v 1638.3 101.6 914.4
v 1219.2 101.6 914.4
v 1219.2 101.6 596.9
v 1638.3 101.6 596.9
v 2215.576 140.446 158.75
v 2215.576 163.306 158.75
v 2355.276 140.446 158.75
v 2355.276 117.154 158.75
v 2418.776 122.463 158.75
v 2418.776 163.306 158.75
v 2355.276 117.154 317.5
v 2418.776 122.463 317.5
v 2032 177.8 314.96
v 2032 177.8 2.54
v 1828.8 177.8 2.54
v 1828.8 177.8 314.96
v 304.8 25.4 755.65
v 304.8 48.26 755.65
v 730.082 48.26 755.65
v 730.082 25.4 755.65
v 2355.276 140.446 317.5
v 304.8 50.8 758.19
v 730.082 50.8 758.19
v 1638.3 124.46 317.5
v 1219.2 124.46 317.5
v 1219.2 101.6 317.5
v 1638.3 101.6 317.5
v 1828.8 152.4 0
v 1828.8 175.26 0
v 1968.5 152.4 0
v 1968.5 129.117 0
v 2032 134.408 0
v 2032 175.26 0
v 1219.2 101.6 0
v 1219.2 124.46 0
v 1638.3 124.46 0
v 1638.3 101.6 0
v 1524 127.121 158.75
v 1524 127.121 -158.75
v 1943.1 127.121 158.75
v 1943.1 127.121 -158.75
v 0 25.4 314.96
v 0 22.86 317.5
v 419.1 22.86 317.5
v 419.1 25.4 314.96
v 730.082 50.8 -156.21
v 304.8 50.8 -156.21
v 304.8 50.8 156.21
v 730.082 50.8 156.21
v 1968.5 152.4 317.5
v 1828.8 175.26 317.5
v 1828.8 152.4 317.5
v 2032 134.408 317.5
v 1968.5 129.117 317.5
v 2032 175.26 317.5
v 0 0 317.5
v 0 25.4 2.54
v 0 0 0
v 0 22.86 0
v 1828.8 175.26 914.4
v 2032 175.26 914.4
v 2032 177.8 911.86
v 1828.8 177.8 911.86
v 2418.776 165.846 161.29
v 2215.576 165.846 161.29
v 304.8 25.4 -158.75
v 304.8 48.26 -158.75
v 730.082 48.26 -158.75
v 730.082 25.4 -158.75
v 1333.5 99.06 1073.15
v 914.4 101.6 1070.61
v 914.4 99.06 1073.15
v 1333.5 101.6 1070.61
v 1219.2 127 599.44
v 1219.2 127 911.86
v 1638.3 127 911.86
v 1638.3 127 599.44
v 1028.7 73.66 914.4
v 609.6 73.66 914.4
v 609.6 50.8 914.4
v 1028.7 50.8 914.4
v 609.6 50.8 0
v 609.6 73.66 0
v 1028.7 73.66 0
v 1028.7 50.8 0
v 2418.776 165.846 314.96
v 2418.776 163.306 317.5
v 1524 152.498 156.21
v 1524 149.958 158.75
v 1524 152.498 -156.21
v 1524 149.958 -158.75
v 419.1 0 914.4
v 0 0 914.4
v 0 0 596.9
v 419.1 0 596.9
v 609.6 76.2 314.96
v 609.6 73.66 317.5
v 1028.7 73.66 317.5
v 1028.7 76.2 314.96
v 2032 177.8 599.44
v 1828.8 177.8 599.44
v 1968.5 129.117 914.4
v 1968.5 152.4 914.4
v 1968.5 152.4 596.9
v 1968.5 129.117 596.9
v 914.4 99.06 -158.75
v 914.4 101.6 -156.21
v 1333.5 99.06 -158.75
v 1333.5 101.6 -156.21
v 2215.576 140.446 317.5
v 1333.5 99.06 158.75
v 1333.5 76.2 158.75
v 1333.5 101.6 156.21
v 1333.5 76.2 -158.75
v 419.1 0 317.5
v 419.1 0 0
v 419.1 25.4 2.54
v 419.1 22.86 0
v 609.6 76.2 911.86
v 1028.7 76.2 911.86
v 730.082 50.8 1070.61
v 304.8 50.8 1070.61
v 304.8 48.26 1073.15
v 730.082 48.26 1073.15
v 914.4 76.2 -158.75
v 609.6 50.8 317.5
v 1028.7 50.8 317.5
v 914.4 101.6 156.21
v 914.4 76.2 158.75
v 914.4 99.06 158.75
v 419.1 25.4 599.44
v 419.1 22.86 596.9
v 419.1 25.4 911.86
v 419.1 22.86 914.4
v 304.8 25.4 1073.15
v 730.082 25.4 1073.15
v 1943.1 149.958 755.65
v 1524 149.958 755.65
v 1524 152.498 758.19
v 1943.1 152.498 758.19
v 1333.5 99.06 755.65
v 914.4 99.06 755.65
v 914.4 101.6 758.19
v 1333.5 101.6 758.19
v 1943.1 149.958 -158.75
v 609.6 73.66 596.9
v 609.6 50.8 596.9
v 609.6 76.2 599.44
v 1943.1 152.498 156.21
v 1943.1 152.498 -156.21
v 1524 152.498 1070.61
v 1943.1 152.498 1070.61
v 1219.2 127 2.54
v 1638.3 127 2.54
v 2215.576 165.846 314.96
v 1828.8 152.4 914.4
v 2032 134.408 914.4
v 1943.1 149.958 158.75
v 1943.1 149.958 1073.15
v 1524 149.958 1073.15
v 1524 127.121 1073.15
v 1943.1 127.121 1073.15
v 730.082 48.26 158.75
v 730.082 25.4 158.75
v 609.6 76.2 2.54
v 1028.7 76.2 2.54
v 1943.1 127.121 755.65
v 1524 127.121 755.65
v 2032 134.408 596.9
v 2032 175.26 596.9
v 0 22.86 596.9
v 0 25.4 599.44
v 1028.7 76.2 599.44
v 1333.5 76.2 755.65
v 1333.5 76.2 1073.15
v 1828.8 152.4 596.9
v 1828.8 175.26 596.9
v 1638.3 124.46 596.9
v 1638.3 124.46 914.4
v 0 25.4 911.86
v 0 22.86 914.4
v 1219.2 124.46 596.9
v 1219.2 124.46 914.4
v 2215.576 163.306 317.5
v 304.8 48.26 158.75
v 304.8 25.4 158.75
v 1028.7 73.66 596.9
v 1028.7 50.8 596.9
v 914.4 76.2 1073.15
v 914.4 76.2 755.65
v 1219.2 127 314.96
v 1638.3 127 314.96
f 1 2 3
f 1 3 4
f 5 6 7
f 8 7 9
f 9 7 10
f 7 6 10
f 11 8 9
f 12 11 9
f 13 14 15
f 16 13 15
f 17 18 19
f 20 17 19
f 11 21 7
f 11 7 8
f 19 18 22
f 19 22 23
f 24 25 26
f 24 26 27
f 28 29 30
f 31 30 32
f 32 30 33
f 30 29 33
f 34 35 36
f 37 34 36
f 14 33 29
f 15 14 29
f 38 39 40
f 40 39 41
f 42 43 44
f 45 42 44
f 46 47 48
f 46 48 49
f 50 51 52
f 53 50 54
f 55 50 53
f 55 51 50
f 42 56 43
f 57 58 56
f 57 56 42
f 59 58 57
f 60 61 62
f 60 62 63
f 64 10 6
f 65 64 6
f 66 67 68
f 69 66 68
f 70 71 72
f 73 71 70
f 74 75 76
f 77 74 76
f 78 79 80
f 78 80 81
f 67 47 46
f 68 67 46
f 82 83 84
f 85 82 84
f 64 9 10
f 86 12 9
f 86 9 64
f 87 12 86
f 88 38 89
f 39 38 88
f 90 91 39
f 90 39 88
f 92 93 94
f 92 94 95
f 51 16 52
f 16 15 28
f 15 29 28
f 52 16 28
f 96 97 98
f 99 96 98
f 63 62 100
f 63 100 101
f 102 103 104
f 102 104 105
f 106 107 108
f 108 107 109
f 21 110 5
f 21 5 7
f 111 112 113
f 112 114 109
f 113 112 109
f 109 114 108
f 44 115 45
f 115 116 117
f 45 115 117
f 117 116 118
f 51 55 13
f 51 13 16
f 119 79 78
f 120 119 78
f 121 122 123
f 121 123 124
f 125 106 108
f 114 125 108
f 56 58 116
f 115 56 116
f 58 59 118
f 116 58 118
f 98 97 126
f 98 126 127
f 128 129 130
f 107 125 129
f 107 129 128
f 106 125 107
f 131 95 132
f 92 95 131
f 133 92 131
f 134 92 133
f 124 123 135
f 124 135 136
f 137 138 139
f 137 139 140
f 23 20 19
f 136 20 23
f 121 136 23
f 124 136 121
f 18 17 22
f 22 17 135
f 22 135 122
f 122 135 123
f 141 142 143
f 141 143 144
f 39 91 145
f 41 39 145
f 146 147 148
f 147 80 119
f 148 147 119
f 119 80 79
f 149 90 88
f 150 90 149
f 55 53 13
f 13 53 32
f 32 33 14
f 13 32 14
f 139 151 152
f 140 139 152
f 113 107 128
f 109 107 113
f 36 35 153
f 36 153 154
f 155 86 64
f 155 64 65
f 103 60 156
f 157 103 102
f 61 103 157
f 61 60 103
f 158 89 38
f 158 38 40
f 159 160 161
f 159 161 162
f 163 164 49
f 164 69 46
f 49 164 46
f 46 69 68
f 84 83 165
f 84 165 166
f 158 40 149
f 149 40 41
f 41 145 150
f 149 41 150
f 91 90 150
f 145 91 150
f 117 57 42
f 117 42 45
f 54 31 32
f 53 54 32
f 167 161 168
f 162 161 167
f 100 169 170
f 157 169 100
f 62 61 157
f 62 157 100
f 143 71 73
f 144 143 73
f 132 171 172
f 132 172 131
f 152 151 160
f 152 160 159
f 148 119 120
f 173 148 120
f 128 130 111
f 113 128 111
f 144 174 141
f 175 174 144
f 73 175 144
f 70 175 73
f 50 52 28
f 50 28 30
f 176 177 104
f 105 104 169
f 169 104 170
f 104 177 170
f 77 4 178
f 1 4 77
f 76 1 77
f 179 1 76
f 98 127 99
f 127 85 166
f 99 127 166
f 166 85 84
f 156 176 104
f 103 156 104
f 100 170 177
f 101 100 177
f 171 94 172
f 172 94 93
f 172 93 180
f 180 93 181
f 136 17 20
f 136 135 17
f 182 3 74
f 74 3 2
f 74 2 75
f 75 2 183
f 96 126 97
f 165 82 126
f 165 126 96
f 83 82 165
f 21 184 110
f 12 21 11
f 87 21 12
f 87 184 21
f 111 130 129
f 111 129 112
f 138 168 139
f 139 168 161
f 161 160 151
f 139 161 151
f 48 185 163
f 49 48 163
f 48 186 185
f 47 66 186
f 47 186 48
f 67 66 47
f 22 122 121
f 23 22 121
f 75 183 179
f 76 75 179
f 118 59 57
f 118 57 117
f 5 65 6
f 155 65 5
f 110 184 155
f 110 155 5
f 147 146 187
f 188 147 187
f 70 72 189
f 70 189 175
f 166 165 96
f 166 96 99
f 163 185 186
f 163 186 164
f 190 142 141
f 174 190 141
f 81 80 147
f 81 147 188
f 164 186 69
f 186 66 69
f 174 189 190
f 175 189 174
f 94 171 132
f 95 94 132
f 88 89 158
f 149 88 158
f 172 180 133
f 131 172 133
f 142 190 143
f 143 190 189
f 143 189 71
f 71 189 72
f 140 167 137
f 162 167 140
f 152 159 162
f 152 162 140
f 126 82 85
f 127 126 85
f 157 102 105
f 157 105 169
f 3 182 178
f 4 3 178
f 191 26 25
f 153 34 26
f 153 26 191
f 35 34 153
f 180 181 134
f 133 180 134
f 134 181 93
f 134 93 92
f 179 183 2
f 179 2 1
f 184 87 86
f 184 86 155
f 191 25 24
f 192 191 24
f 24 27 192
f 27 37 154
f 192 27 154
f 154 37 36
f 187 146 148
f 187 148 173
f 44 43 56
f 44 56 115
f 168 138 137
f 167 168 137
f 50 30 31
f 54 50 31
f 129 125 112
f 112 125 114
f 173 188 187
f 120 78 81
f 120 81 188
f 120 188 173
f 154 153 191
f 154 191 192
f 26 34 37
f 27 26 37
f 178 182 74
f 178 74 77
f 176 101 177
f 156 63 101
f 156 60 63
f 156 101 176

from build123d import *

# Parameters (mm, degrees)
F0_W          = 419.1
F0_H          = 25.4
F1_DEPTH      = 317.5
F2_SIZE       = 2.54
F2_2_SIZE     = 2.54
F2_3_SIZE     = 2.54
F2_4_SIZE     = 2.54
F4_W          = 425.2820260142
F4_H          = 25.4
F5_DEPTH      = 311.15
F5_DEPTH_BACK = 6.35
F4_W_2        = 419.1
F4_H_2        = 25.3773033619
F6_SIZE       = 2.54
F6_2_SIZE     = 2.54
F6_3_SIZE     = 2.54
F8_DEPTH      = 158.75
F9_SIZE       = 2.54


# Not quite as in the source:
# - a feature names something its author has since deleted; it is built from what else it names


with BuildPart() as f1:
    # F0 (on Top) → F1 (new body)
    with BuildSketch(Plane.XY):
        with Locations((209.55, 12.7)):
            Rectangle(F0_W, F0_H)
    extrude(amount=F1_DEPTH)

    # F2
    f2_edges = [f1.edges().sort_by_distance(p)[0] for p in [
        (209.55, 25.4, 317.5),
        (209.55, 25.4, 0),
    ]]
    chamfer(f2_edges, length=F2_SIZE)


with BuildPart() as f1b:
    # F0 (on Top) → F1, piece 2 (new body)
    with BuildSketch(Plane.XY):
        with Locations((819.15, 63.5)):
            Rectangle(F0_W, F0_H)
    extrude(amount=F1_DEPTH)

    # F2#2
    f2_2_edges = [f1b.edges().sort_by_distance(p)[0] for p in [
        (819.15, 76.2, 317.5),
        (819.15, 76.2, 0),
    ]]
    chamfer(f2_2_edges, length=F2_2_SIZE)


with BuildPart() as f1c:
    # F0 (on Top) → F1, piece 3 (new body)
    with BuildSketch(Plane.XY):
        with Locations((1428.75, 114.3)):
            Rectangle(F0_W, F0_H)
    extrude(amount=F1_DEPTH)

    # F2#3
    f2_3_edges = [f1c.edges().sort_by_distance(p)[0] for p in [
        (1428.75, 127, 317.5),
        (1428.75, 127, 0),
    ]]
    chamfer(f2_3_edges, length=F2_3_SIZE)


with BuildPart() as f1d:
    # F0 (on Top) → F1, piece 4 (new body)
    with BuildSketch(Plane.XY):
        Polygon((1968.5, 152.4), (1968.5, 129.1166666667), (2032, 134.4083333333), (2032, 177.8), (1828.8, 177.8), (1828.8, 152.4), align=None)
    extrude(amount=F1_DEPTH)

    # F2#4
    f2_4_edges = [f1d.edges().sort_by_distance(p)[0] for p in [
        (1930.4, 177.8, 317.5),
        (1930.4, 177.8, 0),
    ]]
    chamfer(f2_4_edges, length=F2_4_SIZE)


with BuildPart() as f5:
    # F4 (on offset) → F5 (new body, two sides)
    with BuildSketch(Plane.XY.offset(152.4)) as f5_sk:
        with Locations((517.4410130071, 38.1)):
            Rectangle(F4_W, F4_H)
    extrude(amount=-F5_DEPTH)
    extrude(f5_sk.sketch, amount=F5_DEPTH_BACK)

    # F6
    f6_edges = [f5.edges().sort_by_distance(p)[0] for p in [
        (517.441013, 50.8, 158.75),
        (517.441013, 50.8, -158.75),
    ]]
    chamfer(f6_edges, length=F6_SIZE)


with BuildPart() as f5b:
    # F4 (on offset) → F5, piece 2 (new body, two sides)
    with BuildSketch(Plane.XY.offset(152.4)) as f5_2_sk:
        with Locations((1123.95, 88.9)):
            Rectangle(F4_W_2, F4_H)
    extrude(amount=-F5_DEPTH)
    extrude(f5_2_sk.sketch, amount=F5_DEPTH_BACK)

    # F6#2
    f6_2_edges = [f5b.edges().sort_by_distance(p)[0] for p in [
        (1123.95, 101.6, -158.75),
        (1123.95, 101.6, 158.75),
    ]]
    chamfer(f6_2_edges, length=F6_2_SIZE)


with BuildPart() as f5c:
    # F4 (on offset) → F5, piece 3 (new body, two sides)
    with BuildSketch(Plane.XY.offset(152.4)) as f5_3_sk:
        with Locations((1733.55, 139.8095786572)):
            Rectangle(F4_W_2, F4_H_2)
    extrude(amount=-F5_DEPTH)
    extrude(f5_3_sk.sketch, amount=F5_DEPTH_BACK)

    # F6#3
    f6_3_edges = [f5c.edges().sort_by_distance(p)[0] for p in [
        (1733.55, 152.49823, -158.75),
        (1733.55, 152.49823, 158.75),
    ]]
    chamfer(f6_3_edges, length=F6_3_SIZE)


with BuildPart() as f8:
    # F7 (on face) → F8 (new body)
    with BuildSketch(Plane.XY.offset(317.5)):
        Polygon((2418.7764174887, 165.8460989008), (2215.5764174887, 165.8460989008), (2215.5764174887, 140.4460989008), (2355.2764174887, 140.4460989008), (2355.2764174887, 117.1542989008), (2418.7764174887, 122.4628989008), align=None)
    extrude(amount=-F8_DEPTH)

    # F9
    f9_edges = [f8.edges().sort_by_distance(p)[0] for p in [
        (2317.176417, 165.846099, 317.5),
        (2317.176417, 165.846099, 158.75),
    ]]
    chamfer(f9_edges, length=F9_SIZE)


with BuildPart() as f11_1:
    # F11: instance of F5c
    add(f5c.part.mirror(Plane.XY.offset(457.2)))


with BuildPart() as f11_2:
    # F11: instance of F5b
    add(f5b.part.mirror(Plane.XY.offset(457.2)))


with BuildPart() as f11_3:
    # F11: instance of F5
    add(f5.part.mirror(Plane.XY.offset(457.2)))


with BuildPart() as f11_4:
    # F11: instance of F1d
    add(f1d.part.mirror(Plane.XY.offset(457.2)))


with BuildPart() as f11_5:
    # F11: instance of F1c
    add(f1c.part.mirror(Plane.XY.offset(457.2)))


with BuildPart() as f11_6:
    # F11: instance of F1b
    add(f1b.part.mirror(Plane.XY.offset(457.2)))


with BuildPart() as f11_7:
    # F11: instance of F1
    add(f1.part.mirror(Plane.XY.offset(457.2)))


solid = Compound([f1.part, f1b.part, f1c.part, f1d.part, f5.part, f5b.part, f5c.part, f8.part, f11_1.part, f11_2.part, f11_3.part, f11_4.part, f11_5.part, f11_6.part, f11_7.part])
